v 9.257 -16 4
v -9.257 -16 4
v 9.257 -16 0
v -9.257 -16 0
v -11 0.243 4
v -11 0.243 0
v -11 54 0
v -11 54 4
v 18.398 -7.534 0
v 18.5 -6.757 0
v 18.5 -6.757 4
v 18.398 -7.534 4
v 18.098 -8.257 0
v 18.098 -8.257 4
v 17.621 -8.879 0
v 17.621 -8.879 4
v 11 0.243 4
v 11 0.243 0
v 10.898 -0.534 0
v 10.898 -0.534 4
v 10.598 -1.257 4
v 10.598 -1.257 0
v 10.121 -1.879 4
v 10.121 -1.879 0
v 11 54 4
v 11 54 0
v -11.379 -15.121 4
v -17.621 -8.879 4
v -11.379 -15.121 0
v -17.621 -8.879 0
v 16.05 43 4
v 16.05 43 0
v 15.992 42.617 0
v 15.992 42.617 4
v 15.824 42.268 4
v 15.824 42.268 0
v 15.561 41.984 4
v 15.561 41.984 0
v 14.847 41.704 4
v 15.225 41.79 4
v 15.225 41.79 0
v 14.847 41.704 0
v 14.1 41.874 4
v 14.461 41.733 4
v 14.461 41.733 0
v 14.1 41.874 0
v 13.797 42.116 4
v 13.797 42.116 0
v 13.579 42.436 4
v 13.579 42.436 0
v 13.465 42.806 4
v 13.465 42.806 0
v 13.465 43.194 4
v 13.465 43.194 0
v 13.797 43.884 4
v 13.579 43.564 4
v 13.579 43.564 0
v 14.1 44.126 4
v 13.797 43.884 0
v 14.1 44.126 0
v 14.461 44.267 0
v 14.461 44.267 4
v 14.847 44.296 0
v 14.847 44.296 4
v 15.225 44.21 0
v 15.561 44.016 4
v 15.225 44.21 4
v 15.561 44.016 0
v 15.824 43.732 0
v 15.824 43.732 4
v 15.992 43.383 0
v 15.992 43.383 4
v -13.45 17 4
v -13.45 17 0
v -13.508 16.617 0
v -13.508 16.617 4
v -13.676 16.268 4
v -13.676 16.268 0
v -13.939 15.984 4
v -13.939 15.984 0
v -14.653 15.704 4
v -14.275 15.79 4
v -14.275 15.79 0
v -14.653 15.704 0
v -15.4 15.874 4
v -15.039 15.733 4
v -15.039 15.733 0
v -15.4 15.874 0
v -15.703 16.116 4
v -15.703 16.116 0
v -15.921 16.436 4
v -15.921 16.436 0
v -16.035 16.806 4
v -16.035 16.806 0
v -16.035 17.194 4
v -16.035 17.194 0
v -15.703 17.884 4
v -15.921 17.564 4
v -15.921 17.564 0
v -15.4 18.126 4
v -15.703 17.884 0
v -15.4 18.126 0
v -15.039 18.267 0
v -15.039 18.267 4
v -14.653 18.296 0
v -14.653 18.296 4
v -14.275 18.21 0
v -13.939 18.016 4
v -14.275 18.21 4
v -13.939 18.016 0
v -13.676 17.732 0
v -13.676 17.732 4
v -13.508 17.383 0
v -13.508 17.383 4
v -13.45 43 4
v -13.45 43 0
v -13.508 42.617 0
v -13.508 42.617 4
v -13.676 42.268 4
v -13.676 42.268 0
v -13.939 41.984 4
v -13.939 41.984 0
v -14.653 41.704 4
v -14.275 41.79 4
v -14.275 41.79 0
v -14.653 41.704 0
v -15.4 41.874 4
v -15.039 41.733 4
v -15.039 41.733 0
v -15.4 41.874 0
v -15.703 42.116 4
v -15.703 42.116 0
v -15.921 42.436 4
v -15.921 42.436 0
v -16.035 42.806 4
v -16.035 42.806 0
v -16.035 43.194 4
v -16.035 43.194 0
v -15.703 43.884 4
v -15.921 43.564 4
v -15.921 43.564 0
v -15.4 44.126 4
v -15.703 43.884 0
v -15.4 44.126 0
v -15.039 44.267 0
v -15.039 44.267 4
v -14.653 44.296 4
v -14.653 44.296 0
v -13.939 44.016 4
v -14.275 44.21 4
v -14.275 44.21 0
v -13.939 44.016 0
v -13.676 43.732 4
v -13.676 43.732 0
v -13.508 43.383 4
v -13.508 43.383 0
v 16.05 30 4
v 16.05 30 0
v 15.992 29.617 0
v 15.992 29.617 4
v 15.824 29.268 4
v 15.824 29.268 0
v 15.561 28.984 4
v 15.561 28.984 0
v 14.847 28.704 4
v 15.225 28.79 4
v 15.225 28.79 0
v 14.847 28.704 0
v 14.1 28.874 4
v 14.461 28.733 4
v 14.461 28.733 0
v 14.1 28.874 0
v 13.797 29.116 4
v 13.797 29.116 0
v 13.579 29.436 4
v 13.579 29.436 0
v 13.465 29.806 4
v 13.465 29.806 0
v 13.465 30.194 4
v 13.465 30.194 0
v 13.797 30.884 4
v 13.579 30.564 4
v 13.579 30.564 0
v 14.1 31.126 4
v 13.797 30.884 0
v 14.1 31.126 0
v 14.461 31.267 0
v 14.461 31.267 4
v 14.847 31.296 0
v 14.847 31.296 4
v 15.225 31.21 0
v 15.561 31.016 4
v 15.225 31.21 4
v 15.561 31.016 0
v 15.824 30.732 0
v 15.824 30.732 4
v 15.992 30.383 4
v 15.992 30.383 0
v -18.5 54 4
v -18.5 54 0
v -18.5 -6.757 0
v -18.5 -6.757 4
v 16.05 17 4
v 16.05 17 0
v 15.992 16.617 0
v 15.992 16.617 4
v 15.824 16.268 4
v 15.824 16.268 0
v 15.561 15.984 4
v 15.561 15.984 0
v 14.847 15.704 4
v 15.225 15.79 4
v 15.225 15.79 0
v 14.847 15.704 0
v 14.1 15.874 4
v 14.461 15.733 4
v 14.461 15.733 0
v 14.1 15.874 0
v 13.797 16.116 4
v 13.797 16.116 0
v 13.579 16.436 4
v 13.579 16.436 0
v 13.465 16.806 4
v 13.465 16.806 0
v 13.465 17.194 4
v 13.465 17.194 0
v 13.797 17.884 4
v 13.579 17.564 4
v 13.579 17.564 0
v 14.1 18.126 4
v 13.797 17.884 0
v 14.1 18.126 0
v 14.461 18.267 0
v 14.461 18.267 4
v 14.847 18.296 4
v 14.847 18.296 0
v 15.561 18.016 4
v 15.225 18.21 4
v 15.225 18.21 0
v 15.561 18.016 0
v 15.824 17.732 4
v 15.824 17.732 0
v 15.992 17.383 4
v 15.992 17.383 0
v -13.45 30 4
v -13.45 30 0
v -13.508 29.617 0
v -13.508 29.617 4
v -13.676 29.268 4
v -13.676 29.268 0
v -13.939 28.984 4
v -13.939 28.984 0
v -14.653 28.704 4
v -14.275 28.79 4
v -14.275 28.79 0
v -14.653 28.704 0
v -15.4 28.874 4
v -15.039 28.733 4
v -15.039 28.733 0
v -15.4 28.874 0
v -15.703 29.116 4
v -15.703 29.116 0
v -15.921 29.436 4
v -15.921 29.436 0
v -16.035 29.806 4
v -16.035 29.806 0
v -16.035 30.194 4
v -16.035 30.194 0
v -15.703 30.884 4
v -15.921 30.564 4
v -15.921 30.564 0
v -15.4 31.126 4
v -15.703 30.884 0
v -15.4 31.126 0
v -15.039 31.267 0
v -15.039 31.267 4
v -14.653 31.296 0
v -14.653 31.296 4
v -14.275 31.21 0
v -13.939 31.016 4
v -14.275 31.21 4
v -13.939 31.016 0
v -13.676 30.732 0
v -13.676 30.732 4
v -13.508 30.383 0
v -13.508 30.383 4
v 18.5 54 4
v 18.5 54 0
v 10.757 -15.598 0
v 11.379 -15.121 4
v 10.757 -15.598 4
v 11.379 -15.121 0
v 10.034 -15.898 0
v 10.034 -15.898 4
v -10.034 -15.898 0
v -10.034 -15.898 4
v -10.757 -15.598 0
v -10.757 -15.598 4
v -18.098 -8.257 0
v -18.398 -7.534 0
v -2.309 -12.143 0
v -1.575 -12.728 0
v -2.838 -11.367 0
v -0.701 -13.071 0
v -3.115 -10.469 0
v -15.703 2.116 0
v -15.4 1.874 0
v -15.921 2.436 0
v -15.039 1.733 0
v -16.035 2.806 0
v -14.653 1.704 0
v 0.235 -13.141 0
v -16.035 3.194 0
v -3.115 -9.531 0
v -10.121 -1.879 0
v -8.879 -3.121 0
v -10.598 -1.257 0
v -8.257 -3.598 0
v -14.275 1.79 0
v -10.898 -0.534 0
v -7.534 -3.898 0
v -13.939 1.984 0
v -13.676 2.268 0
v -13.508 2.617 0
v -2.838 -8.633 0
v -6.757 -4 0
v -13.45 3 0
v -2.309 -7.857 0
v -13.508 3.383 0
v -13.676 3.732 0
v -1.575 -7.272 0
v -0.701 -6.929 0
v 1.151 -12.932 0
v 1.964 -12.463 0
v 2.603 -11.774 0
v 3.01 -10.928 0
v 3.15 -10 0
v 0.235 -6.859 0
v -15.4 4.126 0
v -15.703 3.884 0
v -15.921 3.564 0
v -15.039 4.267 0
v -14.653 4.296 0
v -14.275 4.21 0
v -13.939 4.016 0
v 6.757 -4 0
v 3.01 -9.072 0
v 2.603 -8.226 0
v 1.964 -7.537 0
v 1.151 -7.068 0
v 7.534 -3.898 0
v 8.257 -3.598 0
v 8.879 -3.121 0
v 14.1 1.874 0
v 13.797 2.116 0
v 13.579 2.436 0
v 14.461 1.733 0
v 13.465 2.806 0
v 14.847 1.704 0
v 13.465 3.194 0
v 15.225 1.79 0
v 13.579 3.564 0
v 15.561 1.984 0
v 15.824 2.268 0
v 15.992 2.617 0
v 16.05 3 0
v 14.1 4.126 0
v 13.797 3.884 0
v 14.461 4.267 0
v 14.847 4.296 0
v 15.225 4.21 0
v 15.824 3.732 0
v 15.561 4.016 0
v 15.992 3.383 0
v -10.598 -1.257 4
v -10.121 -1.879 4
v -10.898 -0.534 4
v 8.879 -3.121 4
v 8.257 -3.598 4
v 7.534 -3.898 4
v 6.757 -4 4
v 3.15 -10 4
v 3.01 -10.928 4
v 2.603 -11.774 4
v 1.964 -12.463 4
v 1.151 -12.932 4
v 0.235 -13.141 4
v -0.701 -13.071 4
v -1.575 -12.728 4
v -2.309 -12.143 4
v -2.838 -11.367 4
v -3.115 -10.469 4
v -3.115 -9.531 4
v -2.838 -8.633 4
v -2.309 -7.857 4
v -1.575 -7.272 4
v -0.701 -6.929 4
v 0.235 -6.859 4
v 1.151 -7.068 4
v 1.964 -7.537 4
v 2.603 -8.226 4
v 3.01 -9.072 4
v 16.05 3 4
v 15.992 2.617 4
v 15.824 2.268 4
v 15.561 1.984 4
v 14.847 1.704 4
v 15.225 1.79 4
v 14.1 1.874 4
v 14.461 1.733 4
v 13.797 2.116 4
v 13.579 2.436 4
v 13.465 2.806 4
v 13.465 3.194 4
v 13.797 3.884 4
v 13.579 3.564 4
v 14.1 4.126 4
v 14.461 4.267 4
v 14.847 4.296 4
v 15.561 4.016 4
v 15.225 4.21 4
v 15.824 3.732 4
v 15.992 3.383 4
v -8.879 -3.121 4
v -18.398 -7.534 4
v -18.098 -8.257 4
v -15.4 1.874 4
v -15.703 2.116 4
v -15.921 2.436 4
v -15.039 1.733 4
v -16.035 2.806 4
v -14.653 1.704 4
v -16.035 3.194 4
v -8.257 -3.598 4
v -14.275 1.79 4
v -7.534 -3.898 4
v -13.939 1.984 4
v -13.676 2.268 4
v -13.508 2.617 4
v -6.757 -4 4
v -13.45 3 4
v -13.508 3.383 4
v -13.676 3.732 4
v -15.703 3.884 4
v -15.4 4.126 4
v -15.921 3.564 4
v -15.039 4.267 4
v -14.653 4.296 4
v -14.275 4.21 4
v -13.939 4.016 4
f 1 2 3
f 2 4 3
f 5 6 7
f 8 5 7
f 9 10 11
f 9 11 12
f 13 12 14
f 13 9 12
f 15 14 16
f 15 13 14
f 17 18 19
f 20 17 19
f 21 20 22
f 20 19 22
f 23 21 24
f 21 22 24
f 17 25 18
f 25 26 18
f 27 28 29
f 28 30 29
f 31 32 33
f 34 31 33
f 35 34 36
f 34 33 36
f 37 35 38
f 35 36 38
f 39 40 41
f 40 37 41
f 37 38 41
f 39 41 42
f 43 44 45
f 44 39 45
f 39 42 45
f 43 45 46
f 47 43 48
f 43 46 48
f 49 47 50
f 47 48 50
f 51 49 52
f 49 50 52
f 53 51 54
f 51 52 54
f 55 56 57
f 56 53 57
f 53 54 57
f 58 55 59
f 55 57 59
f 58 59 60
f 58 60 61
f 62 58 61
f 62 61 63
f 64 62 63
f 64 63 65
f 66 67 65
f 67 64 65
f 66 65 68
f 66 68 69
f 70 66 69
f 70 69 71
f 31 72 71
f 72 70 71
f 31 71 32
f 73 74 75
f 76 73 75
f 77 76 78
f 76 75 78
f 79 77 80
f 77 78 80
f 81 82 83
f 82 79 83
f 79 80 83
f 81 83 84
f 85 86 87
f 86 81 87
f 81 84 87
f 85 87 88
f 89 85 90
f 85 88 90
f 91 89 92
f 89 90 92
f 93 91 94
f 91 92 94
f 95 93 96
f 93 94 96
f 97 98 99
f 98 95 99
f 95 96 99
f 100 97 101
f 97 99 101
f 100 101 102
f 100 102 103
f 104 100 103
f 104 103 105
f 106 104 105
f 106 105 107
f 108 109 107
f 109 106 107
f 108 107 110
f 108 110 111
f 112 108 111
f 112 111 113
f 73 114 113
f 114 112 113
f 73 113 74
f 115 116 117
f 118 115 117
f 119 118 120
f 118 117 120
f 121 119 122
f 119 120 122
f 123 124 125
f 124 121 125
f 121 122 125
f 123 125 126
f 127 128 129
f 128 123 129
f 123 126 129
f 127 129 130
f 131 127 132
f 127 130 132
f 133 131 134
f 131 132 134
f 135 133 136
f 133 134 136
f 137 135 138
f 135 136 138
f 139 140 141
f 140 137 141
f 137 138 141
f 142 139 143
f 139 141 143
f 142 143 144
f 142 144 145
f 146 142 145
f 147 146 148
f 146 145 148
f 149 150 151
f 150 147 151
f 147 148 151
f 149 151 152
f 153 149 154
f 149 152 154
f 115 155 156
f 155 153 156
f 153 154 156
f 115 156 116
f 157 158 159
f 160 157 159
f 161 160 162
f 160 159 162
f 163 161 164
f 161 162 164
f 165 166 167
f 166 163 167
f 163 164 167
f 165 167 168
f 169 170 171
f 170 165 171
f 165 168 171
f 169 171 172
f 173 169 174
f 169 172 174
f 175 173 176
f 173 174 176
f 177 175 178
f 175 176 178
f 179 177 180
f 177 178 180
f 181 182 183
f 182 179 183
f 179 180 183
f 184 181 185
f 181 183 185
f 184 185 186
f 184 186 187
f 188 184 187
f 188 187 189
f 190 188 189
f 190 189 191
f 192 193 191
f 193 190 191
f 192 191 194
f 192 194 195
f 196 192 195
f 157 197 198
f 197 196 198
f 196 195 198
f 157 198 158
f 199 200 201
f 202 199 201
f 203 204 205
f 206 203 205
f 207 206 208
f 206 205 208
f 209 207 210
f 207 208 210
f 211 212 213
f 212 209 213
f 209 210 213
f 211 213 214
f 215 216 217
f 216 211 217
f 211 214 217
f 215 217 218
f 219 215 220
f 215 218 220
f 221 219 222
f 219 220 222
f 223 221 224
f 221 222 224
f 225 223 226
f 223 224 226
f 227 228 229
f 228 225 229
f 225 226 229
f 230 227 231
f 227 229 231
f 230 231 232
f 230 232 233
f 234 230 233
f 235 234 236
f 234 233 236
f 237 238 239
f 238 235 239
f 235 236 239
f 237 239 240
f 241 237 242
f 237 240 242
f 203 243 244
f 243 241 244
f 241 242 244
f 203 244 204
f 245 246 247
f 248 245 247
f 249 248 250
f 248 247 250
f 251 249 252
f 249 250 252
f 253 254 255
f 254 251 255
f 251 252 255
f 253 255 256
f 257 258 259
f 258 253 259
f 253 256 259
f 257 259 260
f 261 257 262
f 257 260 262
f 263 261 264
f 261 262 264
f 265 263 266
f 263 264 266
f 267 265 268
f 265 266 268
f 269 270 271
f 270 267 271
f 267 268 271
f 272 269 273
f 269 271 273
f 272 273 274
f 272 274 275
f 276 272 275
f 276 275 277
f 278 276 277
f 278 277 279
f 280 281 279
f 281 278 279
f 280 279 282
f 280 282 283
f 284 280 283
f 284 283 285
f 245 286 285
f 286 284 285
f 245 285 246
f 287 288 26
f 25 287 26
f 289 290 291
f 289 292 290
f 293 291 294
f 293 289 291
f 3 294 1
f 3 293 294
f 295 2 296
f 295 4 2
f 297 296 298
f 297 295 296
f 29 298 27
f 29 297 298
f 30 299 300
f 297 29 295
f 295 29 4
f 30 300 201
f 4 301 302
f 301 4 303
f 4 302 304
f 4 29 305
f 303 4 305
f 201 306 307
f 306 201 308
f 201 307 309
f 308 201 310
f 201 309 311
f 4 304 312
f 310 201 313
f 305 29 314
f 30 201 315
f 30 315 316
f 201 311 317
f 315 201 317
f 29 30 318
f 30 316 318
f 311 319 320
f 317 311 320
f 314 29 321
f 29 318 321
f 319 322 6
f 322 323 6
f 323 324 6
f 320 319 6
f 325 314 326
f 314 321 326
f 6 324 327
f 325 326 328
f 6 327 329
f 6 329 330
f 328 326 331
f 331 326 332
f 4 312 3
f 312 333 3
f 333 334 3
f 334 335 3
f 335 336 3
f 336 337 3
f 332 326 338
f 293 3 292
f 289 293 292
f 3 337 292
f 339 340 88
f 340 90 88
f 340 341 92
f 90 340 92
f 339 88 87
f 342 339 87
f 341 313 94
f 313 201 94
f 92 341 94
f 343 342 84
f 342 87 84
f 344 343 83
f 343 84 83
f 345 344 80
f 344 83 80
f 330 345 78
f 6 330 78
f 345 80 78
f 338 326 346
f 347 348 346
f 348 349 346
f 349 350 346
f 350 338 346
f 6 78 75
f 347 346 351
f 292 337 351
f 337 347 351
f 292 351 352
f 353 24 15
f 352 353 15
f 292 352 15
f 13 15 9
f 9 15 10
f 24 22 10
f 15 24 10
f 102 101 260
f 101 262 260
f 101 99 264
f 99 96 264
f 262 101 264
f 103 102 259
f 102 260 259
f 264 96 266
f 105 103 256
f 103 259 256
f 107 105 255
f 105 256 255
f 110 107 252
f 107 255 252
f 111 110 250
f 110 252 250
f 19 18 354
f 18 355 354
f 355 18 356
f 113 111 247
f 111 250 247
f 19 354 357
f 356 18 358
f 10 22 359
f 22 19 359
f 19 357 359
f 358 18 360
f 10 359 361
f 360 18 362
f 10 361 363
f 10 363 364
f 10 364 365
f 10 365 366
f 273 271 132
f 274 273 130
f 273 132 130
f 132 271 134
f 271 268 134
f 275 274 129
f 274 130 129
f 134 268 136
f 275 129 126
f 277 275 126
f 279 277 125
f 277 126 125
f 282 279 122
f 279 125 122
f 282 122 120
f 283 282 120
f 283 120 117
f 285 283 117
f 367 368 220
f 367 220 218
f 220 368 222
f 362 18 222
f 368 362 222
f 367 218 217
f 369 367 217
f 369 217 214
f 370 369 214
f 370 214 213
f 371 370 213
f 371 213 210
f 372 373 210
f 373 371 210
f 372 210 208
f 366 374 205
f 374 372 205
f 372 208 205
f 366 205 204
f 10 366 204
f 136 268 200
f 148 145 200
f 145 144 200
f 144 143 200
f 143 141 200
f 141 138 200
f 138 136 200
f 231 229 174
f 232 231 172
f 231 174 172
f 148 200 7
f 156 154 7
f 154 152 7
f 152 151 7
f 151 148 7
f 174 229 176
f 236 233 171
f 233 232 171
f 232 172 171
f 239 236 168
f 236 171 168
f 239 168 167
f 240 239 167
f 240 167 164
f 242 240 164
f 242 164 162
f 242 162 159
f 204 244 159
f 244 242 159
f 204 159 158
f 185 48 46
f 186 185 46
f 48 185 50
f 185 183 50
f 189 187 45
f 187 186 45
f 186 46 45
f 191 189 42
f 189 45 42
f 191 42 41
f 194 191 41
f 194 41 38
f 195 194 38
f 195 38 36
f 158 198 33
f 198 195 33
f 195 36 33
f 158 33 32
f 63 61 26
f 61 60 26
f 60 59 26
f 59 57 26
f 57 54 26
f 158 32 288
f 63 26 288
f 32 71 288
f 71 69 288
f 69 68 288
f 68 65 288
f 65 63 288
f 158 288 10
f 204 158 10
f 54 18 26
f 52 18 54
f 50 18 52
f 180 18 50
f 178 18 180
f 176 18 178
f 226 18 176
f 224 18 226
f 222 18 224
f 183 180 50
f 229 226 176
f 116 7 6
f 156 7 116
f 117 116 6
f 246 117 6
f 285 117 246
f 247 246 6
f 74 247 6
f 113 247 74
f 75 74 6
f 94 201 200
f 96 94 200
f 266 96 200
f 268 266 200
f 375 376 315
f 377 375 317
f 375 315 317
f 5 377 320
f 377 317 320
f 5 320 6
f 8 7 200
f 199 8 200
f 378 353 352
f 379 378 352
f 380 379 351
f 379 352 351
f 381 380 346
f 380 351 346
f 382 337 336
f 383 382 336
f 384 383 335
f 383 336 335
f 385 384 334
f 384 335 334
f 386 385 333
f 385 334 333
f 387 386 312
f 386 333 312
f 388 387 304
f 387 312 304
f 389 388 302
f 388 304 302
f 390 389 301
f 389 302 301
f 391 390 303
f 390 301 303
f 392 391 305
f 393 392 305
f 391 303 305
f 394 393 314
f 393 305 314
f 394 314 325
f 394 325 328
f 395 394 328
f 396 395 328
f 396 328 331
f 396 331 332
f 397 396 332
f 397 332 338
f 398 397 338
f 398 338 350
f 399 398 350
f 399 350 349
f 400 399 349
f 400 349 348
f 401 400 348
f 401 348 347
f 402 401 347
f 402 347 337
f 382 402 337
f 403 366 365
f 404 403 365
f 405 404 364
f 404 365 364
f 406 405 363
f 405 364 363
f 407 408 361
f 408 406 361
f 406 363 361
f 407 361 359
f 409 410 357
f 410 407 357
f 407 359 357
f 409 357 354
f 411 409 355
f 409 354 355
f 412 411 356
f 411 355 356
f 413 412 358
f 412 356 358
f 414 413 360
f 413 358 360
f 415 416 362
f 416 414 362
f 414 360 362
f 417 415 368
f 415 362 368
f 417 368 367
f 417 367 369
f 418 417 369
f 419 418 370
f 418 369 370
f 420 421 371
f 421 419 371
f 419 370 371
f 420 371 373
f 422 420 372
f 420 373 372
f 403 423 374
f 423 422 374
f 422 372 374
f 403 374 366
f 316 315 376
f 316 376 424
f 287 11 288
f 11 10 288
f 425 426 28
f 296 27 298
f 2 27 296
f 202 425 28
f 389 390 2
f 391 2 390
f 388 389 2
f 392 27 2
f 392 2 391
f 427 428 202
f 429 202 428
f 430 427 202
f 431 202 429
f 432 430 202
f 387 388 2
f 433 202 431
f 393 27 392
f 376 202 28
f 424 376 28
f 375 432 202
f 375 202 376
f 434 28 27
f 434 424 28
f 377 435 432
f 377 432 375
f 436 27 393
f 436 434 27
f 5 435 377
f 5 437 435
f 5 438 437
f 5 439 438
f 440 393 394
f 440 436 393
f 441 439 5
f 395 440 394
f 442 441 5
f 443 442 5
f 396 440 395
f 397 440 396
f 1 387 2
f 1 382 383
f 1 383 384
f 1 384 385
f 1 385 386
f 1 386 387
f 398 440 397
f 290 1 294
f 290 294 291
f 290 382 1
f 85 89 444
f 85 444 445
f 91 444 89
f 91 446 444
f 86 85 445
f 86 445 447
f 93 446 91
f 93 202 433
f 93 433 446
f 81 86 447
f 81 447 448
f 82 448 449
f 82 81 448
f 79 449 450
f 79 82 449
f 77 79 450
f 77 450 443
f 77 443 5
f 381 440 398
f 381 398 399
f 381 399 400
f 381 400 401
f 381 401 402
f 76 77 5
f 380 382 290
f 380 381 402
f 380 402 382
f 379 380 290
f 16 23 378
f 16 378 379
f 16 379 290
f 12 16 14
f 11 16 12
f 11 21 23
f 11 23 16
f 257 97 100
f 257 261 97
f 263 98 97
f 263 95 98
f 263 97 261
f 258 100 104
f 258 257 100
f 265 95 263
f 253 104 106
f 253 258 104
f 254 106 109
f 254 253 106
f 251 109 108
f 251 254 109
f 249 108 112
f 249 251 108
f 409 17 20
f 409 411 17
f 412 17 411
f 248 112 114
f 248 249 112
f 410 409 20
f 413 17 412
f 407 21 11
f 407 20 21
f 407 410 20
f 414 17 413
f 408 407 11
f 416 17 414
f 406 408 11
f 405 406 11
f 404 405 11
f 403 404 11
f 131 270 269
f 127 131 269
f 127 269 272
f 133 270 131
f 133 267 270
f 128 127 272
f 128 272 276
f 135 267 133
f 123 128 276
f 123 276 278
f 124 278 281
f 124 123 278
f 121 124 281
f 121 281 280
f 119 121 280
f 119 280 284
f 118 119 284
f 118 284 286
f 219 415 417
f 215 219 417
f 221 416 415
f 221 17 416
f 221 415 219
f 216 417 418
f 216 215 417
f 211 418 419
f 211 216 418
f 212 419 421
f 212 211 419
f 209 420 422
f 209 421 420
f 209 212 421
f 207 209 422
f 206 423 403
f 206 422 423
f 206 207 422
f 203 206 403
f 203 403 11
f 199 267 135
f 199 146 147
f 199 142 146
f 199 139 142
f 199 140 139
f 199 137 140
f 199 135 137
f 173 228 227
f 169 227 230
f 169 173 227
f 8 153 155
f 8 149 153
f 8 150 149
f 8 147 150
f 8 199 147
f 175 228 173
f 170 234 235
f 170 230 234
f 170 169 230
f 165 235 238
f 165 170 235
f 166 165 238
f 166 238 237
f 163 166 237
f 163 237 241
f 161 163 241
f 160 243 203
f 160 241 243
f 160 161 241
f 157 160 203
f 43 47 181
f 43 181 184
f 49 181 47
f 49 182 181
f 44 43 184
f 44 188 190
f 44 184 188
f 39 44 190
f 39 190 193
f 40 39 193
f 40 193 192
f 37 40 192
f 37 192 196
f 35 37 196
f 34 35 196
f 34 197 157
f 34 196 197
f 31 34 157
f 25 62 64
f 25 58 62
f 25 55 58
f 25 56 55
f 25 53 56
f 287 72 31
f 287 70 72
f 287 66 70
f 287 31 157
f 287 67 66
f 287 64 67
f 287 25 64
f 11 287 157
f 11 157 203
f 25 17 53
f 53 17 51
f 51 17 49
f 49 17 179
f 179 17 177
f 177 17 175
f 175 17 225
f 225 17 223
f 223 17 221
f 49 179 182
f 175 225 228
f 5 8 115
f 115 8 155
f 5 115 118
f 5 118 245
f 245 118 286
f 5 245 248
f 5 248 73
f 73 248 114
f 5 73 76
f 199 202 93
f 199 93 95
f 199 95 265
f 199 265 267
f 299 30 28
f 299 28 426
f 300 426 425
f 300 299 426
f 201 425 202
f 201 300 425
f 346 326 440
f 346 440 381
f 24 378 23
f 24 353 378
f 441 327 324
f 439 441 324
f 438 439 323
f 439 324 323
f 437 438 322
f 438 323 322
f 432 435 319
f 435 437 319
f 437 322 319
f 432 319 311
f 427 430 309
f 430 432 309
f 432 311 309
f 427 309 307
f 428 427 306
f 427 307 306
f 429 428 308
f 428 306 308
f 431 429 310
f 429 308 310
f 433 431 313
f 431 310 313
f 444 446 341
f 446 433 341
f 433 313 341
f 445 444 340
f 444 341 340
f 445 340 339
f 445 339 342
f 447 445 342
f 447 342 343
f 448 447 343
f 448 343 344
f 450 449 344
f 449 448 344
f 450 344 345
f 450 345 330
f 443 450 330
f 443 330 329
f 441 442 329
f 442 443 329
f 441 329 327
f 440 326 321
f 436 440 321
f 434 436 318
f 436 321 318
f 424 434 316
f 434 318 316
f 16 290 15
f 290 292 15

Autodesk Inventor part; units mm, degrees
ref_plane "YZ Plane" through (0, 0, 0) normal (1, 0, 0) x (0, 1, 0)
ref_plane "XZ Plane" through (0, 0, 0) normal (0, 1, 0) x (-1, 0, 0)
ref_plane "XY Plane" through (0, 0, 0) normal (0, 0, 1) x (1, 0, 0)
sketch "Skizze2" plane through (0, 0, 0) normal (0, 0, 1) x (1, 0, 0)
  line L0 (-26.1954, 0) -> (26.1954, 0) projected
  line L1 (0, -30.2532) -> (0, 68.0422) projected
  line L2 (-18.5, 54) -> (-18.5, -6.7574)
  line L3 (-9.2574, -16) -> (9.2574, -16)
  line L4 (18.5, -6.7574) -> (18.5, 54)
  line L5 (18.5, 54) -> (11, 54)
  line L6 (11, 54) -> (11, 3)
  line L7 (-11, 3) -> (-11, 54)
  line L8 (-11, 54) -> (-18.5, 54)
  circle A0 centre (0, -10) radius 3.15
  circle A1 centre (-14.75, 43) radius 1.3
  circle A2 centre (-14.75, 30) radius 1.3
  circle A3 centre (-14.75, 17) radius 1.3
  circle A4 centre (-14.75, 3) radius 1.3
  circle A5 centre (14.75, 43) radius 1.3
  circle A6 centre (14.75, 30) radius 1.3
  circle A7 centre (14.75, 17) radius 1.3
  circle A8 centre (14.75, 3) radius 1.3
  line L9 (-17.6213, -8.8787) -> (-11.3787, -15.1213)
  line L10 (11.3787, -15.1213) -> (17.6213, -8.8787)
  arc A9 (-18.5, -6.7574) -> (-17.6213, -8.8787) centre (-15.5, -6.7574) ccw
  arc A10 (-11.3787, -15.1213) -> (-9.2574, -16) centre (-9.2574, -13) ccw
  arc A11 (9.2574, -16) -> (11.3787, -15.1213) centre (9.2574, -13) ccw
  line L11 (-11, 3) -> (-11, 0.2426)
  line L12 (11, 3) -> (11, 0.2426)
  line L13 (-6.7574, -4) -> (6.7574, -4)
  line L14 (-10.1213, -1.8787) -> (-8.8787, -3.1213)
  line L15 (8.8787, -3.1213) -> (10.1213, -1.8787)
  arc A12 (-11, 0.2426) -> (-10.1213, -1.8787) centre (-8, 0.2426) ccw
  arc A13 (-8.8787, -3.1213) -> (-6.7574, -4) centre (-6.7574, -1) ccw
  arc A14 (6.7574, -4) -> (8.8787, -3.1213) centre (6.7574, -1) ccw
  arc A15 (10.1213, -1.8787) -> (11, 0.2426) centre (8, 0.2426) ccw
  arc A16 (17.6213, -8.8787) -> (18.5, -6.7574) centre (15.5, -6.7574) ccw
  point P0 (0, 0)
  point P1 (-18.5, -16)
  point P2 (18.5, -16)
  point P3 (11, 0)
  point P4 (-11, 0)
  point P5 (-8, 0)
  point P6 (-11, 3)
  point P7 (8, 0)
  point P8 (11, 3)
  point P9 (-18.5, -8)
  point P10 (-10.5, -16)
  point P11 (10.5, -16)
  point P12 (18.5, -8)
  point P13 (-11, -4)
  point P14 (11, -4)
  point P15 (-11, -1)
  point P16 (-8, -4)
  point P17 (8, -4)
  point P18 (11, -1)
  dimension "d0" = 70
  dimension "d1" = 37
  dimension "d2" = 90
  dimension "d3" = 70
  dimension "d4" = 90
  dimension "d6" = 7.5
  dimension "d8" = 90
  dimension "d9" = 22
  dimension "d10" = 54
  dimension "d11" = 6.3
  dimension "d13" = 6
  dimension "d14" = 2.6
  dimension "d15" = 3.75
  dimension "d16" = 11
  dimension "d17" = 2.6
  dimension "d18" = 2.6
  dimension "d19" = 2.6
  dimension "d20" = 13
  dimension "d21" = 13
  dimension "d22" = 14
  dimension "d23" = 3.75
  dimension "d24" = 3.75
  dimension "d25" = 3.75
  dimension "d26" = 2.6
  dimension "d27" = 2.6
  dimension "d28" = 2.6
  dimension "d29" = 2.6
  dimension "d30" = 3.75
  dimension "d31" = 3
  dimension "d32" = 3
  dimension "d33" = 3
  dimension "d34" = 3
  dimension "d35" = 8
  dimension "d36" = 8
  dimension "d37" = 8
  dimension "d38" = 8
  dimension "d45" = 7
  dimension "d46" = 7
  dimension "d47" = 3
  dimension "d48" = 3
  dimension "d49" = 3
  dimension "d50" = 3
  dimension "d51" = 3
  dimension "d52" = 90
  dimension "d53" = 54
  dimension "d54" = 4
  dimension "d55" = 11
  dimension "d56" = 8
  dimension "d57" = 8
  dimension "d58" = 3
extrude "Extrusion1" add sketch "Skizze2" along normal blind 4 contours L2 L8 L7 L11 A12 L0 | L0 A12 L14 A13 L13 L1 A0 L3 A10 L9 A9 L2 | A15 L12 L6 L5 L4 L0 | L0 L4 A16 L10 A11 L3 L1 A0 L13 A14 L15 A15
equation "\"d3\" = d0"
equation "\"d14\" = d29"
equation "\"d17\" = d28"
equation "\"d18\" = d28"
equation "\"d19\" = d29"
equation "\"d23\" = d24"
equation "\"d24\" = d25"
equation "\"d25\" = d15"
equation "\"d26\" = d29"
equation "\"d27\" = d28"
equation "\"d28\" = d29"
equation "\"d30\" = d15"
equation "\"d32\" = d31"
equation "\"d33\" = d31"
equation "\"d34\" = d33"
equation "\"d36\" = d35"
equation "\"d37\" = d35"
equation "\"d38\" = d37"
equation "\"d46\" = d45"
equation "\"d48\" = d47"
equation "\"d49\" = d47"
equation "\"d50\" = d49"
properties part number "Part1_new1" material "Aluminium 6061"
